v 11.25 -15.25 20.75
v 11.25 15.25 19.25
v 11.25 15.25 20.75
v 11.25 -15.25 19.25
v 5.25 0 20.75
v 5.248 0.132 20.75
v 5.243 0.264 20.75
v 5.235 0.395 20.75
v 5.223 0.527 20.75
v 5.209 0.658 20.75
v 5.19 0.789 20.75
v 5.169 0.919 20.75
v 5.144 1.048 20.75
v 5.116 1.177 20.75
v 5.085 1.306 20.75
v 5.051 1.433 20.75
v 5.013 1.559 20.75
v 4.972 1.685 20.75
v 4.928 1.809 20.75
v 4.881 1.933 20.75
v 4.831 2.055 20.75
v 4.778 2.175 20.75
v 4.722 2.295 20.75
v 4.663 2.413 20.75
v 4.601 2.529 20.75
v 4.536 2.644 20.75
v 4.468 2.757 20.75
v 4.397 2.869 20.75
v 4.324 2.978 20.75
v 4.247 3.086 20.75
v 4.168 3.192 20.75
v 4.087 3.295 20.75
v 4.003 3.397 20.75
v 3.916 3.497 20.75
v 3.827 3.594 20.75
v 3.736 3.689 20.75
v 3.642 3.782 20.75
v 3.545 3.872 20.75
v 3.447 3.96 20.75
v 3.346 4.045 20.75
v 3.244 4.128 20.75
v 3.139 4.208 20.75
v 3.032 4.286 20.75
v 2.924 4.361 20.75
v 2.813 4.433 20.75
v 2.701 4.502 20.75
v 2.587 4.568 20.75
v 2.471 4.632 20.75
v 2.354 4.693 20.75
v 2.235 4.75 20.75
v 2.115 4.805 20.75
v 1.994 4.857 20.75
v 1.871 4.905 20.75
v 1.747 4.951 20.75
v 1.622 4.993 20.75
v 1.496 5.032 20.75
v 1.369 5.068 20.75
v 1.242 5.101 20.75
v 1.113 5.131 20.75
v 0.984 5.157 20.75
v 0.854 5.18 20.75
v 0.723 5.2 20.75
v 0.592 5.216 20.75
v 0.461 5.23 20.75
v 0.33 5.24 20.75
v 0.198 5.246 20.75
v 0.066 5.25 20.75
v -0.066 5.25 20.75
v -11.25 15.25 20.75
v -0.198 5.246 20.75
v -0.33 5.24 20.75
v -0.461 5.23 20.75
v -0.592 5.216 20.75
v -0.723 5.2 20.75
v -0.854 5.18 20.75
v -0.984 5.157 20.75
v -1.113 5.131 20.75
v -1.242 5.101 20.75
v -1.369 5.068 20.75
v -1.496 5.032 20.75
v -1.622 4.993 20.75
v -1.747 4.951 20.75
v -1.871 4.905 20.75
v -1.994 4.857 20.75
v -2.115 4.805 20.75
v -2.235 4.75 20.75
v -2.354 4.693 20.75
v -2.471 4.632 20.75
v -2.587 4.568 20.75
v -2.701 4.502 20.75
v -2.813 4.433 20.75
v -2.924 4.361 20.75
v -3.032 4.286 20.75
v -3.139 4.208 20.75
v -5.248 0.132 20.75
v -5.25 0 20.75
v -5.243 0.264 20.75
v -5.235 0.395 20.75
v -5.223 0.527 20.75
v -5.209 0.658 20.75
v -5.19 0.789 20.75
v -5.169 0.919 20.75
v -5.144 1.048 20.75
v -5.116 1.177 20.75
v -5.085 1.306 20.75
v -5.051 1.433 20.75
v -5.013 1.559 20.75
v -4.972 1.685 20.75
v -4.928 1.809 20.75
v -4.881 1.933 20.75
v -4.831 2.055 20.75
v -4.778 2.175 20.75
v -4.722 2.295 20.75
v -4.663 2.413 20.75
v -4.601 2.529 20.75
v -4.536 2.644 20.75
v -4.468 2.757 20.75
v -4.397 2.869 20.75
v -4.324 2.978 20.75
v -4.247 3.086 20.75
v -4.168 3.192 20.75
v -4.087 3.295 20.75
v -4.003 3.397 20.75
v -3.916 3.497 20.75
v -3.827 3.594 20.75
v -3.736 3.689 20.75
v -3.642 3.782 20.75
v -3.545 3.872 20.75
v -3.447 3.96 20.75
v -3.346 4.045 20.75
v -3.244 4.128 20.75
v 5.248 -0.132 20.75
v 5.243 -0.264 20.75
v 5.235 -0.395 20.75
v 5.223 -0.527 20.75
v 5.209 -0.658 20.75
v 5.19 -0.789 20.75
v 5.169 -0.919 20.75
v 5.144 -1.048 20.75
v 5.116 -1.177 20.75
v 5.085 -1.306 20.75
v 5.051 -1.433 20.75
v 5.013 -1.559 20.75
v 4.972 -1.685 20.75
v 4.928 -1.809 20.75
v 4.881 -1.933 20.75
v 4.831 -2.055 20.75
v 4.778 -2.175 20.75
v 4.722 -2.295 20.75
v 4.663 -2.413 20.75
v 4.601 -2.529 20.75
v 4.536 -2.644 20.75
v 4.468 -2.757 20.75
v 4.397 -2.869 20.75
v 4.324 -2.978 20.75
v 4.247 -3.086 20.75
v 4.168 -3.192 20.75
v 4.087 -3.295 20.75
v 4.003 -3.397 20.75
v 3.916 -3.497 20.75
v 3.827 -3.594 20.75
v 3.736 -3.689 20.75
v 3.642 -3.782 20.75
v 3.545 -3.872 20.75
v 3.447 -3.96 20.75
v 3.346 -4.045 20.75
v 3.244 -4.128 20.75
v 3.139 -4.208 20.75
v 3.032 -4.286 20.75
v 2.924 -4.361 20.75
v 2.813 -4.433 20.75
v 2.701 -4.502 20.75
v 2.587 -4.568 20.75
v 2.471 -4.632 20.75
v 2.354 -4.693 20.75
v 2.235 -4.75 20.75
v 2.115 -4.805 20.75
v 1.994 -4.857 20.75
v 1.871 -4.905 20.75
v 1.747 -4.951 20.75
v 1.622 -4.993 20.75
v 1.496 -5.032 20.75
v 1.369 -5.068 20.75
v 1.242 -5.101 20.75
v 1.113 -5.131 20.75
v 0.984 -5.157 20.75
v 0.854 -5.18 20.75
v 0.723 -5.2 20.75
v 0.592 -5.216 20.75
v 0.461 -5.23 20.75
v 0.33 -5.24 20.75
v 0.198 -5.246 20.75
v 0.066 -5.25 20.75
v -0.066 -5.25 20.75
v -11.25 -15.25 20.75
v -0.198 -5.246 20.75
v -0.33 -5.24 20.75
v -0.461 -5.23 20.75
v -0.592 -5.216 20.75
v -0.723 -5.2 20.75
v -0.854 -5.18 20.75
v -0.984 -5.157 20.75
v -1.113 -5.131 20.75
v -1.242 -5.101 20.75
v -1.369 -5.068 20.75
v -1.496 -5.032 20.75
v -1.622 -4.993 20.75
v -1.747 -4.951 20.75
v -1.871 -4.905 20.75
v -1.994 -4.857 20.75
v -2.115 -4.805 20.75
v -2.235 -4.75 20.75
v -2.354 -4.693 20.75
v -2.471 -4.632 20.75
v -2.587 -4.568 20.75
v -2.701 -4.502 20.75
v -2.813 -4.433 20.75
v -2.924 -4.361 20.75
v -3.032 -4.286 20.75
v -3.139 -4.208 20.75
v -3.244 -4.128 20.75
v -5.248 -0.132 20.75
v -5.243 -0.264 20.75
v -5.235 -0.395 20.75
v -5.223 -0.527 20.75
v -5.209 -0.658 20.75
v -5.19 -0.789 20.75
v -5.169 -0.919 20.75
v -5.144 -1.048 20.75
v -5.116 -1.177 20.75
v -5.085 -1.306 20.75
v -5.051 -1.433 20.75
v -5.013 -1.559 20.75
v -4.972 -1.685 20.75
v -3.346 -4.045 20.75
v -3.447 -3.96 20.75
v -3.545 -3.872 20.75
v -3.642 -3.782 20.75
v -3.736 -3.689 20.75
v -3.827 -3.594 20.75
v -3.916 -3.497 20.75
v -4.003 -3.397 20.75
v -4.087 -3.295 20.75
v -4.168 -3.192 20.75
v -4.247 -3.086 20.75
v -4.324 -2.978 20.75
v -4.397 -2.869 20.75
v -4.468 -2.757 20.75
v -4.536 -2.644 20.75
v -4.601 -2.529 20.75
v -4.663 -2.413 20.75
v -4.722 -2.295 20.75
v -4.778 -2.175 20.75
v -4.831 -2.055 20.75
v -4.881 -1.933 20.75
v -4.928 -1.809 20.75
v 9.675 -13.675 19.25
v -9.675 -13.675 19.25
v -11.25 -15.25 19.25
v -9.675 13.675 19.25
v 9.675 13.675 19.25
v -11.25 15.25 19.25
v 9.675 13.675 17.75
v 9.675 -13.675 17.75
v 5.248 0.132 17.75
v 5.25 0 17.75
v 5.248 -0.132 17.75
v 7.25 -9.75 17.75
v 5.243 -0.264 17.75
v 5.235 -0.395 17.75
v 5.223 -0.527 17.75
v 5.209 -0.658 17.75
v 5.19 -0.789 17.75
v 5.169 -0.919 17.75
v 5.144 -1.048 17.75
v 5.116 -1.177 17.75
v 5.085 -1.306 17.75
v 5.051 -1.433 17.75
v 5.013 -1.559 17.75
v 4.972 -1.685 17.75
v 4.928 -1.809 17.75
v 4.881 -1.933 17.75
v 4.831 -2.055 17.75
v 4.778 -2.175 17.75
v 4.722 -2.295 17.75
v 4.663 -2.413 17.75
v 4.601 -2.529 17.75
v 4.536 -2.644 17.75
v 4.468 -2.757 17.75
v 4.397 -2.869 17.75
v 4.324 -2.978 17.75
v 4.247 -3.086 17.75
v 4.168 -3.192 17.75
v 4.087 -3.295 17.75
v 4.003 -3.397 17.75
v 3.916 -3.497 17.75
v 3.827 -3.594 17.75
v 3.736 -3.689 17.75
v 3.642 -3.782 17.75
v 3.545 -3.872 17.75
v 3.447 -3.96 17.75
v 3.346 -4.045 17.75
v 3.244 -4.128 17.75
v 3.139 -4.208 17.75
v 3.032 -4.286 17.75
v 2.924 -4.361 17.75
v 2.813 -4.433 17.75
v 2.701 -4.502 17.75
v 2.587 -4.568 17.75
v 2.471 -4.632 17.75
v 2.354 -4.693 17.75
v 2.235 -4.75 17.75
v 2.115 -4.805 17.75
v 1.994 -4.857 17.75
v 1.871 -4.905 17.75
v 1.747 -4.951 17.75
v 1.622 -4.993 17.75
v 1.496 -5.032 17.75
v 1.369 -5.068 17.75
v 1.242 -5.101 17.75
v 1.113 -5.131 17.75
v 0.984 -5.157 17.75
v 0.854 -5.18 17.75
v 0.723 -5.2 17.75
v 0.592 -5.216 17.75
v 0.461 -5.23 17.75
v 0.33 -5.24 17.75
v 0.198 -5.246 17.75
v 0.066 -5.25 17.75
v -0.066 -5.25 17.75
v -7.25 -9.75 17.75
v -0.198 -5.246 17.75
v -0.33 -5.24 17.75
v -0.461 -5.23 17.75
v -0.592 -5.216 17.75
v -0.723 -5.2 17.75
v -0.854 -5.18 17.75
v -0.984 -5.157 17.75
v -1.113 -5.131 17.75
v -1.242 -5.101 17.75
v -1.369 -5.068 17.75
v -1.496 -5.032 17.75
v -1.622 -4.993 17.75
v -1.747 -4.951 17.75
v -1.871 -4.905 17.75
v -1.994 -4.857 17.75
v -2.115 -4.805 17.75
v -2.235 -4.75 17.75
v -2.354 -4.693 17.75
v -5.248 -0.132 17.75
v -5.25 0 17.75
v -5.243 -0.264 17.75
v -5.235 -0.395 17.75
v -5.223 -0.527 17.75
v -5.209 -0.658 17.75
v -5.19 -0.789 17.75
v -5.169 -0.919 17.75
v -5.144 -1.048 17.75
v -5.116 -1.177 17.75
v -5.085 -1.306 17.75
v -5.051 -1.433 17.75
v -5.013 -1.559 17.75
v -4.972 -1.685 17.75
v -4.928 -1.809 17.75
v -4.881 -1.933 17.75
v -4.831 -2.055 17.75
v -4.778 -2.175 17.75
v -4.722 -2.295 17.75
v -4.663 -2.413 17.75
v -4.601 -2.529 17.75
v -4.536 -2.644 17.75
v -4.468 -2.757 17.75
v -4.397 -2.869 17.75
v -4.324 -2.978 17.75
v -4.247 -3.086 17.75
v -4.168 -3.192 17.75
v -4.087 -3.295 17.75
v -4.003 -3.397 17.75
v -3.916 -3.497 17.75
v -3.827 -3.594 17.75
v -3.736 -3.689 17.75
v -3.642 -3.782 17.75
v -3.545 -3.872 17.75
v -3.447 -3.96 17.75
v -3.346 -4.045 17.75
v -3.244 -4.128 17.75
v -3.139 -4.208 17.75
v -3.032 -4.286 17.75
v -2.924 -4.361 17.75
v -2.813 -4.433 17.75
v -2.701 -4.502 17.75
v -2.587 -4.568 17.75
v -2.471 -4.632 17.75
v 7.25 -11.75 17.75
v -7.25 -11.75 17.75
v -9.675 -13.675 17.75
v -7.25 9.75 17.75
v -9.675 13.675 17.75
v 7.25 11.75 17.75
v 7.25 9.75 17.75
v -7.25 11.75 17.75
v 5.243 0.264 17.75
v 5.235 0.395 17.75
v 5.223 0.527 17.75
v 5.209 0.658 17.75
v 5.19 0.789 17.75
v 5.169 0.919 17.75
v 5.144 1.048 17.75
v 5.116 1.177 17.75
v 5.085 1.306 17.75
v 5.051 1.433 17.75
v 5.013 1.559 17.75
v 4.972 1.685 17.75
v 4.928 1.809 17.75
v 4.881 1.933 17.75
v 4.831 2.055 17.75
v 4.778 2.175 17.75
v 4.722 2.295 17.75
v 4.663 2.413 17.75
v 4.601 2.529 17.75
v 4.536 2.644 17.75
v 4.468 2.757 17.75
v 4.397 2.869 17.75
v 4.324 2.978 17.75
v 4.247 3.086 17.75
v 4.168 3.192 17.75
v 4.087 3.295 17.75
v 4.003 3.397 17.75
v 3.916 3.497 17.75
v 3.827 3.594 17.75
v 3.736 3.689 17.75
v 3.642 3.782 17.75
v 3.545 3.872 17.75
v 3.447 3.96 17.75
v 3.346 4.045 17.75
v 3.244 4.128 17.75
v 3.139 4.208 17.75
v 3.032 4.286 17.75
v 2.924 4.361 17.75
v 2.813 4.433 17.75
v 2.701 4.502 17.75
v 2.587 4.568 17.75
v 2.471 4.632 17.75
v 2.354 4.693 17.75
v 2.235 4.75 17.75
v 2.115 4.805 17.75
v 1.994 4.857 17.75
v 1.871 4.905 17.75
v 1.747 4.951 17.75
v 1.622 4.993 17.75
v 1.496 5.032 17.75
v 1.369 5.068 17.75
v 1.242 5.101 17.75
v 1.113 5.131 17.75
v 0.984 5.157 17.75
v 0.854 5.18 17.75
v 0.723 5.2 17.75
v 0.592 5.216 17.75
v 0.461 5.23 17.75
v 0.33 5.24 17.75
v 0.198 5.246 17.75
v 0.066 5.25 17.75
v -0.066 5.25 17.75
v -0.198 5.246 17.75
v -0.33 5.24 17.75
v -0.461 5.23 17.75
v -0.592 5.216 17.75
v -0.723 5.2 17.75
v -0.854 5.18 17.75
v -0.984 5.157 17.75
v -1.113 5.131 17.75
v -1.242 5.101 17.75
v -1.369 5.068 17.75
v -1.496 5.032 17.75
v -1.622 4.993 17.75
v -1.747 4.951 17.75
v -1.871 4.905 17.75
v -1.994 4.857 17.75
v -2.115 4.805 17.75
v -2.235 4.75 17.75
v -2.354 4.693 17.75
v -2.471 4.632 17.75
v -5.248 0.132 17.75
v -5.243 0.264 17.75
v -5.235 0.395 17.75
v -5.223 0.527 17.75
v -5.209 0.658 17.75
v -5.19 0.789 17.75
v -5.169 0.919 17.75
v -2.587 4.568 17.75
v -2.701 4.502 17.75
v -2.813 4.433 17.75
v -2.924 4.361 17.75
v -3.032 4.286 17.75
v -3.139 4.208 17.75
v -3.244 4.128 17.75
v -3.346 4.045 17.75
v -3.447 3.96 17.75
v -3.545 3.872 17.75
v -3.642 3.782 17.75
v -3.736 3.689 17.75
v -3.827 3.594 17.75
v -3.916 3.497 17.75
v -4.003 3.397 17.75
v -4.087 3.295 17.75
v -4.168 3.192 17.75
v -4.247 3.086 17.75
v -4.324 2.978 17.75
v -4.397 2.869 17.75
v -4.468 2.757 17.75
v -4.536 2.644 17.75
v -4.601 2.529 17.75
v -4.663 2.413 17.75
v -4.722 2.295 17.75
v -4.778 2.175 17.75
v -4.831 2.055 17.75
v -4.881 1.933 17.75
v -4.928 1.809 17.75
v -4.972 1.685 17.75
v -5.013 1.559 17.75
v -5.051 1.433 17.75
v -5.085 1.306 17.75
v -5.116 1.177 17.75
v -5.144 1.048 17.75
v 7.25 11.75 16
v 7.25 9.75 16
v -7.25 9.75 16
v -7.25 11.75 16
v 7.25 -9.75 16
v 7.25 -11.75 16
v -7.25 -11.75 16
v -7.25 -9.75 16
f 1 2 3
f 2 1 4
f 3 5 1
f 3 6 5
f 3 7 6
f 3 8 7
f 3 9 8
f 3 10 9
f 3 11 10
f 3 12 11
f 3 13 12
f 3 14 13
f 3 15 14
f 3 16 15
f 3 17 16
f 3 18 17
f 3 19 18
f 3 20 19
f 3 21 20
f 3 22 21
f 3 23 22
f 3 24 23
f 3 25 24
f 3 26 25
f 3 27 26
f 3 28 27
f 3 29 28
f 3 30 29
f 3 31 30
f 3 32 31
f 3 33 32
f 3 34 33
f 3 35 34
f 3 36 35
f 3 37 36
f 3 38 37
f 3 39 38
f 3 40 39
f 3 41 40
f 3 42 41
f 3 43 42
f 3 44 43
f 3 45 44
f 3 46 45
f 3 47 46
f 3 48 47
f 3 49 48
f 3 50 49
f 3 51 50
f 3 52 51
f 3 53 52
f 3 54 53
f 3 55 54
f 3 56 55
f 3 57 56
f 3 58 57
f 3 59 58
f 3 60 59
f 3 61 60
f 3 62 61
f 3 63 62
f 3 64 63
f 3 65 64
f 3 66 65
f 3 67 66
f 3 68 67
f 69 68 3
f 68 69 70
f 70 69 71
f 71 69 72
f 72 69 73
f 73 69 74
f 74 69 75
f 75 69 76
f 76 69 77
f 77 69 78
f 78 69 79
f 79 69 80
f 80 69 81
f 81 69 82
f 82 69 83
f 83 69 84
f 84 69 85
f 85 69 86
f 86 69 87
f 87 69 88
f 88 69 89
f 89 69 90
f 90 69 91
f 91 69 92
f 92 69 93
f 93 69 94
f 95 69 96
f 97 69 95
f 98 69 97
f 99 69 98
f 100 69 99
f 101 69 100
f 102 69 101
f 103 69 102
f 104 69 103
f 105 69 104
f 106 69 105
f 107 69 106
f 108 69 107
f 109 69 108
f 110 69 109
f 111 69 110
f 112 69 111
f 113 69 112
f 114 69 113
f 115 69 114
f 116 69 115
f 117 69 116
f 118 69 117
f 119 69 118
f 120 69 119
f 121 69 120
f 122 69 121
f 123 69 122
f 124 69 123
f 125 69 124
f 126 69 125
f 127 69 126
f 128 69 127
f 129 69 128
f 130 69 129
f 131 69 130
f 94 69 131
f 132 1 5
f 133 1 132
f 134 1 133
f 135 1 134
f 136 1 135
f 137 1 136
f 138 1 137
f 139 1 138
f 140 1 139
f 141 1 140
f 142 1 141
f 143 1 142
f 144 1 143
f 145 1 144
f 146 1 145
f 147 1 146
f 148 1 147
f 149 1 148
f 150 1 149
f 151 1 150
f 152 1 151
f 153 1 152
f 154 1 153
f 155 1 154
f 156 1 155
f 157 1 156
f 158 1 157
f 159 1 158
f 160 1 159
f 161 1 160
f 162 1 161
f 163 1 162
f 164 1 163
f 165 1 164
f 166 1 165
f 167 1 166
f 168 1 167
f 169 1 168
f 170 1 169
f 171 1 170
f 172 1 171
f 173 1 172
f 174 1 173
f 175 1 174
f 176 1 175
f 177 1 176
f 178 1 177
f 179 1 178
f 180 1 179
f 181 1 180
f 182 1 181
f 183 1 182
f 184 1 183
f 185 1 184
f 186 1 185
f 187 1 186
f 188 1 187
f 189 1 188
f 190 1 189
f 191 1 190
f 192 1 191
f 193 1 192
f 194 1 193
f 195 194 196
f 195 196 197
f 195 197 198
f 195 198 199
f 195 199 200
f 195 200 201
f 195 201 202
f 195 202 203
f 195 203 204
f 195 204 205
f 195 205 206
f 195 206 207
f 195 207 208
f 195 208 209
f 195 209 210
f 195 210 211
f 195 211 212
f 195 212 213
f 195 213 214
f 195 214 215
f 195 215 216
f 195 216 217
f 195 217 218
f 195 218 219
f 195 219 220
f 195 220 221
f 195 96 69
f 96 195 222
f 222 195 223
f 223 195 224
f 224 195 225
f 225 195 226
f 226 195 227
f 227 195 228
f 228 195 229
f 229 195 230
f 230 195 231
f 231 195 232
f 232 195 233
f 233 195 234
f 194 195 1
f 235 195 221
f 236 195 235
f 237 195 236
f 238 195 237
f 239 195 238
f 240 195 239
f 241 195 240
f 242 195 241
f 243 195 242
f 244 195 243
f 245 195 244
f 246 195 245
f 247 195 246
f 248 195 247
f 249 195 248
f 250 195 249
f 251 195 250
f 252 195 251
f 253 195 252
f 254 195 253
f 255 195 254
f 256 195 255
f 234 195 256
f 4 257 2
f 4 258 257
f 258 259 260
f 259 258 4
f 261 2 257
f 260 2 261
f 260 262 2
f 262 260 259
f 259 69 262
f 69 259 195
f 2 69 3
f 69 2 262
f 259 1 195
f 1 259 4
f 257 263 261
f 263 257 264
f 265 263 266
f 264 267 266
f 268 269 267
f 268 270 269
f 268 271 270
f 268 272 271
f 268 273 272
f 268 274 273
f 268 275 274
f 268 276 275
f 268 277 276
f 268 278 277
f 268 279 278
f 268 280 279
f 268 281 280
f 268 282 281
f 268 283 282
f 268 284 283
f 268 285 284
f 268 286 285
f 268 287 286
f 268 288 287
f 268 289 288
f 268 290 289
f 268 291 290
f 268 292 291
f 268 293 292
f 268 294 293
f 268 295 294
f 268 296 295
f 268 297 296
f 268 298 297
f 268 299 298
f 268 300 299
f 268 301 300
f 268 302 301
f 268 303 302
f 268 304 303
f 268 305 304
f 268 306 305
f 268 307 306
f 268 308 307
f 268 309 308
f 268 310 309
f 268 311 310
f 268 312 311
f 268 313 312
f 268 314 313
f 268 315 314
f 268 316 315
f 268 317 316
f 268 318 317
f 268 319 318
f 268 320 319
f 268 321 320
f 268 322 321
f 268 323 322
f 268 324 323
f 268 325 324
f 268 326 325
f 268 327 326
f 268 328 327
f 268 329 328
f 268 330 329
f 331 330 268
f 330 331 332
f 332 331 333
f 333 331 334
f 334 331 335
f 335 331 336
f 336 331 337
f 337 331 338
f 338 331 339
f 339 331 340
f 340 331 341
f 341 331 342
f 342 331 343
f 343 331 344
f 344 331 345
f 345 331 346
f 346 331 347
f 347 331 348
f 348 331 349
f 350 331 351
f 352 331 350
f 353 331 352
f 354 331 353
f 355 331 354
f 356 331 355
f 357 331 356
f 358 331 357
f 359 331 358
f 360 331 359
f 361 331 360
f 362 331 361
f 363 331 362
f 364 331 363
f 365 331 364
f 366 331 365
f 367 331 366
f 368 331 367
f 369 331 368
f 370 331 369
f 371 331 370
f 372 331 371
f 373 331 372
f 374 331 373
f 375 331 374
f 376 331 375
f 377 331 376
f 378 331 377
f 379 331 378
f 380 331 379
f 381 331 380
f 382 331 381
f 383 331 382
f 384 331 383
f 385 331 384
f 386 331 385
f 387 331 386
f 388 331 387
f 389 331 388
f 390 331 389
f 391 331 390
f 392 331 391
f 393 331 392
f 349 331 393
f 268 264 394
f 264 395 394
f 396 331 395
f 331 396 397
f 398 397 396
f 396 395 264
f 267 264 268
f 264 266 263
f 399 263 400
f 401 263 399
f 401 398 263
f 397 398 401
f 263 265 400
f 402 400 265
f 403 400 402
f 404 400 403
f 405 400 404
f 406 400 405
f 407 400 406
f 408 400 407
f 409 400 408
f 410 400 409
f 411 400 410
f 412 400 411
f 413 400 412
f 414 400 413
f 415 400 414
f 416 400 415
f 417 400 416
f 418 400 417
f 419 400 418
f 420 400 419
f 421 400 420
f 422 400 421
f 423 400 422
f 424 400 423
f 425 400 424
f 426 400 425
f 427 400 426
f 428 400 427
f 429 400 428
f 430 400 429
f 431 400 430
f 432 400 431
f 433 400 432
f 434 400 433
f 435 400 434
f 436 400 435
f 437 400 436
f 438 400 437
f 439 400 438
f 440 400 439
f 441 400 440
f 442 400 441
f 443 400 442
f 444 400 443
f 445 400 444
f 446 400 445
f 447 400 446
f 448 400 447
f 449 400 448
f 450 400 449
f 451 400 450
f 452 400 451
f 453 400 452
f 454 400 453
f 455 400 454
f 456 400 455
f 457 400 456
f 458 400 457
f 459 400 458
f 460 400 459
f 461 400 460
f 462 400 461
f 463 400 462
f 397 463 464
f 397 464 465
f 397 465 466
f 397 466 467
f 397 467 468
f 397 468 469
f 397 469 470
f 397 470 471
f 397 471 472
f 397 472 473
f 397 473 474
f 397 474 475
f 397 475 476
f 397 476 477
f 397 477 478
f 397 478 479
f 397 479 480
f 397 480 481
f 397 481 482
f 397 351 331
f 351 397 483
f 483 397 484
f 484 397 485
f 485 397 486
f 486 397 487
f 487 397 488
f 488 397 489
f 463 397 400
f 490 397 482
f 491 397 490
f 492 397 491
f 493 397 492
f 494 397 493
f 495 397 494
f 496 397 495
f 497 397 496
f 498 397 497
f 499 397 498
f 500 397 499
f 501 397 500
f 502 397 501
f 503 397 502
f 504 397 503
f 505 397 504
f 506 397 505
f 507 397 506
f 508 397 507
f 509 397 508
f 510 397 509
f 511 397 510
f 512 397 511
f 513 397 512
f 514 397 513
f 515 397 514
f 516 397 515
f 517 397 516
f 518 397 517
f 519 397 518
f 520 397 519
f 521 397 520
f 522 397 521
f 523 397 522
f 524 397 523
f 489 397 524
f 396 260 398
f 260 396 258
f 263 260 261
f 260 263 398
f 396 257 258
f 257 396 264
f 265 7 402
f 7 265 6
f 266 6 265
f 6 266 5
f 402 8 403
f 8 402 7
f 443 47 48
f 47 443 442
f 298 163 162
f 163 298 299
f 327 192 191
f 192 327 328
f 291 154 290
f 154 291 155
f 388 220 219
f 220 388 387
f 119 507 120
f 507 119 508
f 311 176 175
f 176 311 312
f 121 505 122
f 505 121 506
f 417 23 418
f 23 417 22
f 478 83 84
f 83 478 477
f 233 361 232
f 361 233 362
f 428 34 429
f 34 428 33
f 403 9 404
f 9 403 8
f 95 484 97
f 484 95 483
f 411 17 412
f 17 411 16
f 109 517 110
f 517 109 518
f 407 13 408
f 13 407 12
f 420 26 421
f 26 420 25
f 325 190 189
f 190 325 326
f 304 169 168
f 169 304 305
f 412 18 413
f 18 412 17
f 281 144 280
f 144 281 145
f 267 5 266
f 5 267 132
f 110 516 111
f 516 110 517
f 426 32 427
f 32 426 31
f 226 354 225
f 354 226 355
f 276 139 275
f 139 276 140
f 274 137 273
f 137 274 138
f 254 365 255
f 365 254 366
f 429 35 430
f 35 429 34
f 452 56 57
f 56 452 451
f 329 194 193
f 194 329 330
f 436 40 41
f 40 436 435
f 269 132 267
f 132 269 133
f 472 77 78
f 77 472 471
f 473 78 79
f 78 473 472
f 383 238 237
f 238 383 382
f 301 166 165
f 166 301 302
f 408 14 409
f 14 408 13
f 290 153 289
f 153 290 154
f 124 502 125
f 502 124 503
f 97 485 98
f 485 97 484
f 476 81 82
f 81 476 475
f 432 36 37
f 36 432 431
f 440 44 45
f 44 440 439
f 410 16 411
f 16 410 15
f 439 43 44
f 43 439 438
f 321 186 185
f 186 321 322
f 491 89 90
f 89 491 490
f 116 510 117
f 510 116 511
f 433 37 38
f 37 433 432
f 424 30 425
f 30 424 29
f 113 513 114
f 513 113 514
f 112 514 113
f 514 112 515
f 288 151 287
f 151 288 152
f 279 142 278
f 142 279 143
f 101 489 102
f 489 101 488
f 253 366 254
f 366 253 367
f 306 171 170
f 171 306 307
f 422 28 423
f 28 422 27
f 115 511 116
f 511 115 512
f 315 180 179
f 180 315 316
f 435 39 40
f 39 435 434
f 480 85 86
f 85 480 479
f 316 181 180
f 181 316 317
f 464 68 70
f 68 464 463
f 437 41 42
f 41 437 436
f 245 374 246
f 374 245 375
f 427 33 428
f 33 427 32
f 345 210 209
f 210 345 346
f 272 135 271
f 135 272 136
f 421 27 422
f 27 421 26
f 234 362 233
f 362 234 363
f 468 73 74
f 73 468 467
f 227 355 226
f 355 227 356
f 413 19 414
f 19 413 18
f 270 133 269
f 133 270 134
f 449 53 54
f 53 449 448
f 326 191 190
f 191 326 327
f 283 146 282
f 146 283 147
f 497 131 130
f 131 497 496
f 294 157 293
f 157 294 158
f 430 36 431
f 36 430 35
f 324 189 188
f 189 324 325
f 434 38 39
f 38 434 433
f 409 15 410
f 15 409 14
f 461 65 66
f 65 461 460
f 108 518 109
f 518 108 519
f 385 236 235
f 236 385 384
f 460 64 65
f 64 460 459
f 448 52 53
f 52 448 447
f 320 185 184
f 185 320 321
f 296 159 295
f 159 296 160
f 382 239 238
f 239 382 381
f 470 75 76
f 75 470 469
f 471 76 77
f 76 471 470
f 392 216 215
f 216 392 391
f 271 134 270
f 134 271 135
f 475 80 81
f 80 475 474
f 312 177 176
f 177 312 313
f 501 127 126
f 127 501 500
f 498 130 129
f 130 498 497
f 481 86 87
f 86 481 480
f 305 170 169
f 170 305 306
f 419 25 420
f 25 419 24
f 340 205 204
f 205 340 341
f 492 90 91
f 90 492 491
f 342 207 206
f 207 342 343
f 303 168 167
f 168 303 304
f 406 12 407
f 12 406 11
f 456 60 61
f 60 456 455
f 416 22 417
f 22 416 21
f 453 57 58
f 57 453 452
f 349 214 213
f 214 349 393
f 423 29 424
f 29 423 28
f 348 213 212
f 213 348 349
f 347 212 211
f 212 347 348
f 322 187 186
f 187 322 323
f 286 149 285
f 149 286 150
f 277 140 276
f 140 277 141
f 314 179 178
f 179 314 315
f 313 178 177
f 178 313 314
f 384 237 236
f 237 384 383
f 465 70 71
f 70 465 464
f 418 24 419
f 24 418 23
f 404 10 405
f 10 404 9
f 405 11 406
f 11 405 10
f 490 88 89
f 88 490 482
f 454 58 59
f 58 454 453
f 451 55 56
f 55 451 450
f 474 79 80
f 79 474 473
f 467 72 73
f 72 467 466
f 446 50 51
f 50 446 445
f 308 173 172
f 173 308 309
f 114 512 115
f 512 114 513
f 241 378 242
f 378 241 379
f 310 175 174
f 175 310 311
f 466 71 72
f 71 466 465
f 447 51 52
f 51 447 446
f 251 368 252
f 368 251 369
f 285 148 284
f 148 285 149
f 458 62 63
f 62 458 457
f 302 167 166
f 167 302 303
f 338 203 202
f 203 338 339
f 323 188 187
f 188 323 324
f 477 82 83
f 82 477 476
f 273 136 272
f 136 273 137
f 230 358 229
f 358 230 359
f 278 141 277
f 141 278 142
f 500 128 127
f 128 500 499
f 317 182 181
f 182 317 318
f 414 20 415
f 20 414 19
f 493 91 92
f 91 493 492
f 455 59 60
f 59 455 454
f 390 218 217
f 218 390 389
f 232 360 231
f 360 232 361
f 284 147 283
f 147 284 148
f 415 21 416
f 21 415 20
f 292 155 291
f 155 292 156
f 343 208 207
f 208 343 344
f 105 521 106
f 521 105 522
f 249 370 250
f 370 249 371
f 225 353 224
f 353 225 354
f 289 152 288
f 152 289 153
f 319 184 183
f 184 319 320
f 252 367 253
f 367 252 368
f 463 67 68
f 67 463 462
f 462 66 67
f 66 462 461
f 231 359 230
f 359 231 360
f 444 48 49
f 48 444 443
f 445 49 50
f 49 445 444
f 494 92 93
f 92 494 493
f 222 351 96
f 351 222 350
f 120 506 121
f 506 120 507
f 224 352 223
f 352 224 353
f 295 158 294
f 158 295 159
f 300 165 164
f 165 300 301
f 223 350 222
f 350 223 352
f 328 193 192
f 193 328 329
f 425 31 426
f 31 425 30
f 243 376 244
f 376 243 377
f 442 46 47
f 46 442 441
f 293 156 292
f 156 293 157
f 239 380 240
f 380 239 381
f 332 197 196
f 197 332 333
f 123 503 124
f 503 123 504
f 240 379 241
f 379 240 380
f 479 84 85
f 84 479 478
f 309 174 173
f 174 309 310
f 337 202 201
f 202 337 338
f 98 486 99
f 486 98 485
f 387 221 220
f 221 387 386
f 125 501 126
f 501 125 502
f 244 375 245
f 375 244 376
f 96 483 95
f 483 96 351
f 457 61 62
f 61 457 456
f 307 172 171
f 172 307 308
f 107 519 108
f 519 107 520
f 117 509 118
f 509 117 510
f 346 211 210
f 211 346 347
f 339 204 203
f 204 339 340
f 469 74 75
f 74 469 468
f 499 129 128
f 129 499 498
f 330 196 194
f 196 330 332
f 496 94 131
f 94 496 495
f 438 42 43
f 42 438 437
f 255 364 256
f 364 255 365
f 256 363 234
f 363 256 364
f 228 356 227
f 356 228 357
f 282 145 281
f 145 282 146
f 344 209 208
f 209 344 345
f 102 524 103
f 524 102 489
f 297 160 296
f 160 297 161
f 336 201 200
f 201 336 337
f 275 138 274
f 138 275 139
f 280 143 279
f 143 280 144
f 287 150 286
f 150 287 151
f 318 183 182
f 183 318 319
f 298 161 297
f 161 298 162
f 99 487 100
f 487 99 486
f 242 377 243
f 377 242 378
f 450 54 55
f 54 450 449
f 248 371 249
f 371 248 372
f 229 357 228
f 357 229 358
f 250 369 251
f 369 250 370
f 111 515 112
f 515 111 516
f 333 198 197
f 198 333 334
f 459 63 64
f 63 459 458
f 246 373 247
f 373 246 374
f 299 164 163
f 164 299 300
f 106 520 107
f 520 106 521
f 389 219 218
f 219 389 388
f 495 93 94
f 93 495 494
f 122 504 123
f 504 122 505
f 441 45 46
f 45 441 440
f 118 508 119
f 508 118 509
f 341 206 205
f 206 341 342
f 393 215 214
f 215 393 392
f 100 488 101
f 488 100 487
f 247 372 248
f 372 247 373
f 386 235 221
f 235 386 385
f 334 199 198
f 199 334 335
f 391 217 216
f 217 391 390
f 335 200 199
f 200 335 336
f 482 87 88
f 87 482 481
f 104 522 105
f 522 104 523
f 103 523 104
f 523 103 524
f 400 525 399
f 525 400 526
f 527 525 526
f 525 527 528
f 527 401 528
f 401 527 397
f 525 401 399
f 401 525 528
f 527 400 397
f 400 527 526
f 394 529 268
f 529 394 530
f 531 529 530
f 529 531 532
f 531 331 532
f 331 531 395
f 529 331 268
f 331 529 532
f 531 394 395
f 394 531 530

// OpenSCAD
width = 19.5;
length = 27.5;
thickness = 1.5;
bandWidth = 9.5;
lenseHole = 10.5;
bandHeight = 2.5;
$fn = 250;

/*
scale([1000, 1000, 1000])
translate([-0.28, -0.255, -1.16])
*import("head.stl", convexity=10);

sphere(d=215);
*/

module bottom() {
    difference() {
        cube([width + 2*thickness, length + 2*thickness, 5], true);
        translate([0, 0, -105])
        sphere(d=215);
        
        cube([2, 2*length, 10], true);
    }

    difference() {
        translate([0, 0, bandHeight / 2 + 3])
        cube([width + 2*thickness, length + 2*thickness, bandHeight + 1], true);
        
        translate([0, 0, bandHeight / 2 + 3])
        cube([bandWidth, 2*length, bandHeight], true);
        
        cube([2, 2*length, 10], true);
    }

    translate([0, 0, bandHeight - 2])
    difference() {
        translate([0, 0, 10])
        cube([width + 2*thickness, length + 2*thickness, 9], true);
        
        translate([0, 0, 10.5])
        cube([width, length, 9], true);
        
        translate([0, length / 2, 7.75])
        cube([8, length, 3.5], true);
        
        translate([0, length / 2, 12])
        cube([1.5, length, 6], true);
    }
}

module top() {
    difference() {
        union() {
            cube([width + 2*thickness, length + 2*thickness, thickness], true);
            translate([0, 0, -thickness])
            cube([width - 0.15, length - 0.15, thickness], true);
        }
        
        translate([0, 0, -5])
        cylinder(d1=lenseHole, d2=lenseHole, 10);
    }
    
    translate([0, length / 2 - 3, -3])
    cube([width - 5, 2, 2], true);
    
    translate([0, -length / 2 + 3, -3])
    cube([width - 5, 2, 2], true);
}

*bottom();
translate([0, 0, 20])
top();
